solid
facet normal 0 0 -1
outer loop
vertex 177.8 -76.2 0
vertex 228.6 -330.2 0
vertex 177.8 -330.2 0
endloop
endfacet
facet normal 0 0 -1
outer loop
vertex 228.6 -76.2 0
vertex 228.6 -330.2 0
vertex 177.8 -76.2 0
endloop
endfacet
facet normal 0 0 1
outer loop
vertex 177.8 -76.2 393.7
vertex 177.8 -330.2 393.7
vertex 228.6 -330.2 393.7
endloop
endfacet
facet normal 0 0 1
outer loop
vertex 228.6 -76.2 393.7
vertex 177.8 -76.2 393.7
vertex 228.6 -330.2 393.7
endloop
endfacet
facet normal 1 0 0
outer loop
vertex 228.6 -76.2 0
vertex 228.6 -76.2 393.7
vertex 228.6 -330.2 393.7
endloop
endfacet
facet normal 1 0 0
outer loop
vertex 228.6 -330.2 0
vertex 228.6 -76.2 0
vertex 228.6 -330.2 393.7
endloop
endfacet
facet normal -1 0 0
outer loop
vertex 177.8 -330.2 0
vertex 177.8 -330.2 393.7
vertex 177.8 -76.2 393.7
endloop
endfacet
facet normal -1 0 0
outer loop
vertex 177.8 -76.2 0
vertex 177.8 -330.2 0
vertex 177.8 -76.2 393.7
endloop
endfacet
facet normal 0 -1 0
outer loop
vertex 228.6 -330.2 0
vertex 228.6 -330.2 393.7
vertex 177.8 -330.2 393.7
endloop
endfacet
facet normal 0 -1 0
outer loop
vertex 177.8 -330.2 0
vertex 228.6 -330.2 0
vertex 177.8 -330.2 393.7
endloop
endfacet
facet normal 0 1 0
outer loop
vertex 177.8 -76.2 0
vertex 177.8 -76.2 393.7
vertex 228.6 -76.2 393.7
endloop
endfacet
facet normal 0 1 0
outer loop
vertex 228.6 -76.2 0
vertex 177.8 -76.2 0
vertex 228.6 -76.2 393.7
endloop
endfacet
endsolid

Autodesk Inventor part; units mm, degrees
ref_plane "YZ Plane" through (0, 0, 0) normal (1, 0, 0) x (0, 1, 0)
ref_plane "XZ Plane" through (0, 0, 0) normal (0, 1, 0) x (-1, 0, 0)
ref_plane "XY Plane" through (0, 0, 0) normal (0, 0, 1) x (1, 0, 0)
sketch "Sketch1" plane through (0, 0, 0) normal (0, 0, 1) x (1, 0, 0)
  line L0 (0, 0) -> (812.8, 0) construction
  line L1 (812.8, 0) -> (812.8, -406.4) construction
  line L2 (812.8, -406.4) -> (0, -406.4) construction
  line L3 (0, -406.4) -> (0, 0) construction
  line L4 (0, 0) -> (406.4, 0)
  line L5 (406.4, 0) -> (406.4, -25.4)
  line L6 (406.4, -25.4) -> (0, -25.4)
  line L7 (0, -25.4) -> (0, 0)
  line L8 (406.4, -25.4) -> (381, -25.4)
  line L9 (381, -25.4) -> (381, -406.4)
  line L10 (381, -406.4) -> (406.4, -406.4)
  line L11 (406.4, -406.4) -> (406.4, -25.4)
  line L12 (381, -406.4) -> (0, -406.4)
  line L13 (0, -406.4) -> (0, -381)
  line L14 (0, -381) -> (381, -381)
  line L15 (381, -381) -> (381, -406.4)
  line L16 (0, -381) -> (25.4, -381)
  line L17 (25.4, -381) -> (25.4, -25.4)
  line L18 (25.4, -25.4) -> (0, -25.4)
  line L19 (0, -25.4) -> (0, -381)
  dimension "d1" = 812.8
  dimension "d5" = 406.4
  dimension "d6" = 25.4
  dimension "d7" = 25.4
  dimension "d8" = 381
  dimension "d9" = 381
  dimension "d10" = 25.4
  dimension "d11" = 25.4
extrude "Extrusion1" add sketch "Sketch1" against normal blind 25.4 contours L6 L9 L14 L17
sketch "Sketch3" plane through (0, 0, 0) normal (0, 0, 1) x (1, 0, 0)
  line L0 (-406.4, 0) -> (406.4, 0) construction
  line L1 (406.4, 0) -> (406.4, -406.4) construction
  line L2 (406.4, -406.4) -> (-406.4, -406.4) construction
  line L3 (-406.4, -406.4) -> (-406.4, 0) construction
  line L4 (406.4, -406.4) -> (406.4, 0)
  line L5 (381, -381) -> (25.4, -381) projected
  line L6 (25.4, -381) -> (177.8, -381)
  line L7 (177.8, -381) -> (203.2, -381)
  line L8 (177.8, -381) -> (177.8, -355.6)
  line L9 (177.8, -355.6) -> (228.6, -355.6)
  line L10 (228.6, -355.6) -> (228.6, -330.2)
  line L11 (228.6, -330.2) -> (254, -330.2)
  line L12 (254, -330.2) -> (254, -76.2)
  line L13 (254, -76.2) -> (228.6, -76.2)
  line L14 (228.6, -76.2) -> (228.6, -50.8)
  line L15 (228.6, -50.8) -> (177.8, -50.8)
  line L16 (177.8, -50.8) -> (177.8, -76.2)
  line L17 (177.8, -76.2) -> (152.4, -76.2)
  line L18 (152.4, -76.2) -> (152.4, -330.2)
  line L19 (152.4, -330.2) -> (177.8, -330.2)
  line L20 (177.8, -330.2) -> (177.8, -355.6)
  point P0 (0, 0)
  dimension "d36" = 812.8
  dimension "d48" = 152.4
  dimension "d49" = 25.4
  dimension "d50" = 25.4
  dimension "d51" = 50.8
  dimension "d52" = 25.4
  dimension "d53" = 25.4
  dimension "d54" = 254
  dimension "d55" = 25.4
  dimension "d56" = 25.4
  dimension "d57" = 50.8
  dimension "d58" = 25.4
  dimension "d59" = 25.4
  dimension "d60" = 254
  dimension "d61" = 25.4
extrude "Extrusion3" add sketch "Sketch3" along normal blind 393.7
sketch "Sketch4" plane through (381, -381, 0) normal (1, 0, 0) x (0, 0, -1)
  line L0 (0, 355.6) -> (25.4, 355.6) projected
  line L1 (153.8842, -0.5875) -> (0, -0.5875)
  line L2 (0, -0.5875) -> (0, 355.6)
  line L3 (0, 355.6) -> (153.8842, 355.6)
  line L4 (153.8842, 355.6) -> (153.8842, -0.5875)
  point P0 (0, 381)
extrude "Extrusion4" cut sketch "Sketch4" against normal blind 393.7
sketch "Sketch6" plane through (0, 0, 393.7) normal (0, 0, 1) x (1, 0, 0)
  line L0 (177.8, -50.8) -> (177.8, -76.2) projected
  line L1 (177.8, -76.2) -> (152.4, -76.2)
  line L2 (152.4, -76.2) -> (152.4, -50.8)
  line L3 (152.4, -50.8) -> (177.8, -50.8)
  line L4 (177.8, -50.8) -> (177.8, -76.2)
  line L5 (228.6, -50.8) -> (228.6, -76.2) projected
  line L6 (228.6, -50.8) -> (254, -50.8)
  line L7 (254, -50.8) -> (254, -76.2)
  line L8 (254, -76.2) -> (228.6, -76.2)
  line L9 (228.6, -76.2) -> (228.6, -50.8)
  line L10 (254, -330.2) -> (228.6, -330.2) projected
  line L11 (228.6, -355.6) -> (177.8, -355.6) projected
  line L12 (254, -330.2) -> (228.6, -330.2)
  line L13 (228.6, -330.2) -> (228.6, -355.6)
  line L14 (228.6, -355.6) -> (254, -355.6)
  line L15 (254, -355.6) -> (254, -330.2)
  line L16 (177.8, -355.6) -> (152.4, -355.6)
  line L17 (152.4, -355.6) -> (152.4, -330.2)
  line L18 (152.4, -330.2) -> (177.8, -330.2)
  line L19 (177.8, -330.2) -> (177.8, -355.6)
  point P0 (0, 0)
  dimension "d68" = 25.4
  dimension "d69" = 25.4
extrude "Extrusion6" add sketch "Sketch6" against normal blind 393.7
sketch "Sketch7" plane through (0, 0, 393.7) normal (0, 0, 1) x (1, 0, 0)
  line L0 (254, -50.8) -> (152.4, -50.8) projected
  line L1 (152.4, -50.8) -> (177.8, -50.8)
  line L2 (177.8, -50.8) -> (177.8, -76.2)
  line L3 (177.8, -76.2) -> (152.4, -76.2)
  line L4 (152.4, -76.2) -> (152.4, -50.8)
  line L5 (177.8, -76.2) -> (228.6, -76.2)
  line L6 (228.6, -76.2) -> (228.6, -330.2)
  line L7 (228.6, -330.2) -> (177.8, -330.2)
  line L8 (177.8, -330.2) -> (177.8, -76.2)
  line L9 (254, -355.6) -> (254, -50.8) projected
  line L10 (152.4, -50.8) -> (254, -50.8)
  line L11 (254, -50.8) -> (254, -355.6)
  line L12 (254, -355.6) -> (152.4, -355.6)
  line L13 (152.4, -355.6) -> (152.4, -50.8)
  point P0 (0, 0)
  dimension "d72" = 25.4
  dimension "d73" = 25.4
  dimension "d74" = 50.8
  dimension "d75" = 254
extrude "Extrusion7" cut sketch "Sketch7" against normal through all
properties part number "JukeBox CD Player SQ"
